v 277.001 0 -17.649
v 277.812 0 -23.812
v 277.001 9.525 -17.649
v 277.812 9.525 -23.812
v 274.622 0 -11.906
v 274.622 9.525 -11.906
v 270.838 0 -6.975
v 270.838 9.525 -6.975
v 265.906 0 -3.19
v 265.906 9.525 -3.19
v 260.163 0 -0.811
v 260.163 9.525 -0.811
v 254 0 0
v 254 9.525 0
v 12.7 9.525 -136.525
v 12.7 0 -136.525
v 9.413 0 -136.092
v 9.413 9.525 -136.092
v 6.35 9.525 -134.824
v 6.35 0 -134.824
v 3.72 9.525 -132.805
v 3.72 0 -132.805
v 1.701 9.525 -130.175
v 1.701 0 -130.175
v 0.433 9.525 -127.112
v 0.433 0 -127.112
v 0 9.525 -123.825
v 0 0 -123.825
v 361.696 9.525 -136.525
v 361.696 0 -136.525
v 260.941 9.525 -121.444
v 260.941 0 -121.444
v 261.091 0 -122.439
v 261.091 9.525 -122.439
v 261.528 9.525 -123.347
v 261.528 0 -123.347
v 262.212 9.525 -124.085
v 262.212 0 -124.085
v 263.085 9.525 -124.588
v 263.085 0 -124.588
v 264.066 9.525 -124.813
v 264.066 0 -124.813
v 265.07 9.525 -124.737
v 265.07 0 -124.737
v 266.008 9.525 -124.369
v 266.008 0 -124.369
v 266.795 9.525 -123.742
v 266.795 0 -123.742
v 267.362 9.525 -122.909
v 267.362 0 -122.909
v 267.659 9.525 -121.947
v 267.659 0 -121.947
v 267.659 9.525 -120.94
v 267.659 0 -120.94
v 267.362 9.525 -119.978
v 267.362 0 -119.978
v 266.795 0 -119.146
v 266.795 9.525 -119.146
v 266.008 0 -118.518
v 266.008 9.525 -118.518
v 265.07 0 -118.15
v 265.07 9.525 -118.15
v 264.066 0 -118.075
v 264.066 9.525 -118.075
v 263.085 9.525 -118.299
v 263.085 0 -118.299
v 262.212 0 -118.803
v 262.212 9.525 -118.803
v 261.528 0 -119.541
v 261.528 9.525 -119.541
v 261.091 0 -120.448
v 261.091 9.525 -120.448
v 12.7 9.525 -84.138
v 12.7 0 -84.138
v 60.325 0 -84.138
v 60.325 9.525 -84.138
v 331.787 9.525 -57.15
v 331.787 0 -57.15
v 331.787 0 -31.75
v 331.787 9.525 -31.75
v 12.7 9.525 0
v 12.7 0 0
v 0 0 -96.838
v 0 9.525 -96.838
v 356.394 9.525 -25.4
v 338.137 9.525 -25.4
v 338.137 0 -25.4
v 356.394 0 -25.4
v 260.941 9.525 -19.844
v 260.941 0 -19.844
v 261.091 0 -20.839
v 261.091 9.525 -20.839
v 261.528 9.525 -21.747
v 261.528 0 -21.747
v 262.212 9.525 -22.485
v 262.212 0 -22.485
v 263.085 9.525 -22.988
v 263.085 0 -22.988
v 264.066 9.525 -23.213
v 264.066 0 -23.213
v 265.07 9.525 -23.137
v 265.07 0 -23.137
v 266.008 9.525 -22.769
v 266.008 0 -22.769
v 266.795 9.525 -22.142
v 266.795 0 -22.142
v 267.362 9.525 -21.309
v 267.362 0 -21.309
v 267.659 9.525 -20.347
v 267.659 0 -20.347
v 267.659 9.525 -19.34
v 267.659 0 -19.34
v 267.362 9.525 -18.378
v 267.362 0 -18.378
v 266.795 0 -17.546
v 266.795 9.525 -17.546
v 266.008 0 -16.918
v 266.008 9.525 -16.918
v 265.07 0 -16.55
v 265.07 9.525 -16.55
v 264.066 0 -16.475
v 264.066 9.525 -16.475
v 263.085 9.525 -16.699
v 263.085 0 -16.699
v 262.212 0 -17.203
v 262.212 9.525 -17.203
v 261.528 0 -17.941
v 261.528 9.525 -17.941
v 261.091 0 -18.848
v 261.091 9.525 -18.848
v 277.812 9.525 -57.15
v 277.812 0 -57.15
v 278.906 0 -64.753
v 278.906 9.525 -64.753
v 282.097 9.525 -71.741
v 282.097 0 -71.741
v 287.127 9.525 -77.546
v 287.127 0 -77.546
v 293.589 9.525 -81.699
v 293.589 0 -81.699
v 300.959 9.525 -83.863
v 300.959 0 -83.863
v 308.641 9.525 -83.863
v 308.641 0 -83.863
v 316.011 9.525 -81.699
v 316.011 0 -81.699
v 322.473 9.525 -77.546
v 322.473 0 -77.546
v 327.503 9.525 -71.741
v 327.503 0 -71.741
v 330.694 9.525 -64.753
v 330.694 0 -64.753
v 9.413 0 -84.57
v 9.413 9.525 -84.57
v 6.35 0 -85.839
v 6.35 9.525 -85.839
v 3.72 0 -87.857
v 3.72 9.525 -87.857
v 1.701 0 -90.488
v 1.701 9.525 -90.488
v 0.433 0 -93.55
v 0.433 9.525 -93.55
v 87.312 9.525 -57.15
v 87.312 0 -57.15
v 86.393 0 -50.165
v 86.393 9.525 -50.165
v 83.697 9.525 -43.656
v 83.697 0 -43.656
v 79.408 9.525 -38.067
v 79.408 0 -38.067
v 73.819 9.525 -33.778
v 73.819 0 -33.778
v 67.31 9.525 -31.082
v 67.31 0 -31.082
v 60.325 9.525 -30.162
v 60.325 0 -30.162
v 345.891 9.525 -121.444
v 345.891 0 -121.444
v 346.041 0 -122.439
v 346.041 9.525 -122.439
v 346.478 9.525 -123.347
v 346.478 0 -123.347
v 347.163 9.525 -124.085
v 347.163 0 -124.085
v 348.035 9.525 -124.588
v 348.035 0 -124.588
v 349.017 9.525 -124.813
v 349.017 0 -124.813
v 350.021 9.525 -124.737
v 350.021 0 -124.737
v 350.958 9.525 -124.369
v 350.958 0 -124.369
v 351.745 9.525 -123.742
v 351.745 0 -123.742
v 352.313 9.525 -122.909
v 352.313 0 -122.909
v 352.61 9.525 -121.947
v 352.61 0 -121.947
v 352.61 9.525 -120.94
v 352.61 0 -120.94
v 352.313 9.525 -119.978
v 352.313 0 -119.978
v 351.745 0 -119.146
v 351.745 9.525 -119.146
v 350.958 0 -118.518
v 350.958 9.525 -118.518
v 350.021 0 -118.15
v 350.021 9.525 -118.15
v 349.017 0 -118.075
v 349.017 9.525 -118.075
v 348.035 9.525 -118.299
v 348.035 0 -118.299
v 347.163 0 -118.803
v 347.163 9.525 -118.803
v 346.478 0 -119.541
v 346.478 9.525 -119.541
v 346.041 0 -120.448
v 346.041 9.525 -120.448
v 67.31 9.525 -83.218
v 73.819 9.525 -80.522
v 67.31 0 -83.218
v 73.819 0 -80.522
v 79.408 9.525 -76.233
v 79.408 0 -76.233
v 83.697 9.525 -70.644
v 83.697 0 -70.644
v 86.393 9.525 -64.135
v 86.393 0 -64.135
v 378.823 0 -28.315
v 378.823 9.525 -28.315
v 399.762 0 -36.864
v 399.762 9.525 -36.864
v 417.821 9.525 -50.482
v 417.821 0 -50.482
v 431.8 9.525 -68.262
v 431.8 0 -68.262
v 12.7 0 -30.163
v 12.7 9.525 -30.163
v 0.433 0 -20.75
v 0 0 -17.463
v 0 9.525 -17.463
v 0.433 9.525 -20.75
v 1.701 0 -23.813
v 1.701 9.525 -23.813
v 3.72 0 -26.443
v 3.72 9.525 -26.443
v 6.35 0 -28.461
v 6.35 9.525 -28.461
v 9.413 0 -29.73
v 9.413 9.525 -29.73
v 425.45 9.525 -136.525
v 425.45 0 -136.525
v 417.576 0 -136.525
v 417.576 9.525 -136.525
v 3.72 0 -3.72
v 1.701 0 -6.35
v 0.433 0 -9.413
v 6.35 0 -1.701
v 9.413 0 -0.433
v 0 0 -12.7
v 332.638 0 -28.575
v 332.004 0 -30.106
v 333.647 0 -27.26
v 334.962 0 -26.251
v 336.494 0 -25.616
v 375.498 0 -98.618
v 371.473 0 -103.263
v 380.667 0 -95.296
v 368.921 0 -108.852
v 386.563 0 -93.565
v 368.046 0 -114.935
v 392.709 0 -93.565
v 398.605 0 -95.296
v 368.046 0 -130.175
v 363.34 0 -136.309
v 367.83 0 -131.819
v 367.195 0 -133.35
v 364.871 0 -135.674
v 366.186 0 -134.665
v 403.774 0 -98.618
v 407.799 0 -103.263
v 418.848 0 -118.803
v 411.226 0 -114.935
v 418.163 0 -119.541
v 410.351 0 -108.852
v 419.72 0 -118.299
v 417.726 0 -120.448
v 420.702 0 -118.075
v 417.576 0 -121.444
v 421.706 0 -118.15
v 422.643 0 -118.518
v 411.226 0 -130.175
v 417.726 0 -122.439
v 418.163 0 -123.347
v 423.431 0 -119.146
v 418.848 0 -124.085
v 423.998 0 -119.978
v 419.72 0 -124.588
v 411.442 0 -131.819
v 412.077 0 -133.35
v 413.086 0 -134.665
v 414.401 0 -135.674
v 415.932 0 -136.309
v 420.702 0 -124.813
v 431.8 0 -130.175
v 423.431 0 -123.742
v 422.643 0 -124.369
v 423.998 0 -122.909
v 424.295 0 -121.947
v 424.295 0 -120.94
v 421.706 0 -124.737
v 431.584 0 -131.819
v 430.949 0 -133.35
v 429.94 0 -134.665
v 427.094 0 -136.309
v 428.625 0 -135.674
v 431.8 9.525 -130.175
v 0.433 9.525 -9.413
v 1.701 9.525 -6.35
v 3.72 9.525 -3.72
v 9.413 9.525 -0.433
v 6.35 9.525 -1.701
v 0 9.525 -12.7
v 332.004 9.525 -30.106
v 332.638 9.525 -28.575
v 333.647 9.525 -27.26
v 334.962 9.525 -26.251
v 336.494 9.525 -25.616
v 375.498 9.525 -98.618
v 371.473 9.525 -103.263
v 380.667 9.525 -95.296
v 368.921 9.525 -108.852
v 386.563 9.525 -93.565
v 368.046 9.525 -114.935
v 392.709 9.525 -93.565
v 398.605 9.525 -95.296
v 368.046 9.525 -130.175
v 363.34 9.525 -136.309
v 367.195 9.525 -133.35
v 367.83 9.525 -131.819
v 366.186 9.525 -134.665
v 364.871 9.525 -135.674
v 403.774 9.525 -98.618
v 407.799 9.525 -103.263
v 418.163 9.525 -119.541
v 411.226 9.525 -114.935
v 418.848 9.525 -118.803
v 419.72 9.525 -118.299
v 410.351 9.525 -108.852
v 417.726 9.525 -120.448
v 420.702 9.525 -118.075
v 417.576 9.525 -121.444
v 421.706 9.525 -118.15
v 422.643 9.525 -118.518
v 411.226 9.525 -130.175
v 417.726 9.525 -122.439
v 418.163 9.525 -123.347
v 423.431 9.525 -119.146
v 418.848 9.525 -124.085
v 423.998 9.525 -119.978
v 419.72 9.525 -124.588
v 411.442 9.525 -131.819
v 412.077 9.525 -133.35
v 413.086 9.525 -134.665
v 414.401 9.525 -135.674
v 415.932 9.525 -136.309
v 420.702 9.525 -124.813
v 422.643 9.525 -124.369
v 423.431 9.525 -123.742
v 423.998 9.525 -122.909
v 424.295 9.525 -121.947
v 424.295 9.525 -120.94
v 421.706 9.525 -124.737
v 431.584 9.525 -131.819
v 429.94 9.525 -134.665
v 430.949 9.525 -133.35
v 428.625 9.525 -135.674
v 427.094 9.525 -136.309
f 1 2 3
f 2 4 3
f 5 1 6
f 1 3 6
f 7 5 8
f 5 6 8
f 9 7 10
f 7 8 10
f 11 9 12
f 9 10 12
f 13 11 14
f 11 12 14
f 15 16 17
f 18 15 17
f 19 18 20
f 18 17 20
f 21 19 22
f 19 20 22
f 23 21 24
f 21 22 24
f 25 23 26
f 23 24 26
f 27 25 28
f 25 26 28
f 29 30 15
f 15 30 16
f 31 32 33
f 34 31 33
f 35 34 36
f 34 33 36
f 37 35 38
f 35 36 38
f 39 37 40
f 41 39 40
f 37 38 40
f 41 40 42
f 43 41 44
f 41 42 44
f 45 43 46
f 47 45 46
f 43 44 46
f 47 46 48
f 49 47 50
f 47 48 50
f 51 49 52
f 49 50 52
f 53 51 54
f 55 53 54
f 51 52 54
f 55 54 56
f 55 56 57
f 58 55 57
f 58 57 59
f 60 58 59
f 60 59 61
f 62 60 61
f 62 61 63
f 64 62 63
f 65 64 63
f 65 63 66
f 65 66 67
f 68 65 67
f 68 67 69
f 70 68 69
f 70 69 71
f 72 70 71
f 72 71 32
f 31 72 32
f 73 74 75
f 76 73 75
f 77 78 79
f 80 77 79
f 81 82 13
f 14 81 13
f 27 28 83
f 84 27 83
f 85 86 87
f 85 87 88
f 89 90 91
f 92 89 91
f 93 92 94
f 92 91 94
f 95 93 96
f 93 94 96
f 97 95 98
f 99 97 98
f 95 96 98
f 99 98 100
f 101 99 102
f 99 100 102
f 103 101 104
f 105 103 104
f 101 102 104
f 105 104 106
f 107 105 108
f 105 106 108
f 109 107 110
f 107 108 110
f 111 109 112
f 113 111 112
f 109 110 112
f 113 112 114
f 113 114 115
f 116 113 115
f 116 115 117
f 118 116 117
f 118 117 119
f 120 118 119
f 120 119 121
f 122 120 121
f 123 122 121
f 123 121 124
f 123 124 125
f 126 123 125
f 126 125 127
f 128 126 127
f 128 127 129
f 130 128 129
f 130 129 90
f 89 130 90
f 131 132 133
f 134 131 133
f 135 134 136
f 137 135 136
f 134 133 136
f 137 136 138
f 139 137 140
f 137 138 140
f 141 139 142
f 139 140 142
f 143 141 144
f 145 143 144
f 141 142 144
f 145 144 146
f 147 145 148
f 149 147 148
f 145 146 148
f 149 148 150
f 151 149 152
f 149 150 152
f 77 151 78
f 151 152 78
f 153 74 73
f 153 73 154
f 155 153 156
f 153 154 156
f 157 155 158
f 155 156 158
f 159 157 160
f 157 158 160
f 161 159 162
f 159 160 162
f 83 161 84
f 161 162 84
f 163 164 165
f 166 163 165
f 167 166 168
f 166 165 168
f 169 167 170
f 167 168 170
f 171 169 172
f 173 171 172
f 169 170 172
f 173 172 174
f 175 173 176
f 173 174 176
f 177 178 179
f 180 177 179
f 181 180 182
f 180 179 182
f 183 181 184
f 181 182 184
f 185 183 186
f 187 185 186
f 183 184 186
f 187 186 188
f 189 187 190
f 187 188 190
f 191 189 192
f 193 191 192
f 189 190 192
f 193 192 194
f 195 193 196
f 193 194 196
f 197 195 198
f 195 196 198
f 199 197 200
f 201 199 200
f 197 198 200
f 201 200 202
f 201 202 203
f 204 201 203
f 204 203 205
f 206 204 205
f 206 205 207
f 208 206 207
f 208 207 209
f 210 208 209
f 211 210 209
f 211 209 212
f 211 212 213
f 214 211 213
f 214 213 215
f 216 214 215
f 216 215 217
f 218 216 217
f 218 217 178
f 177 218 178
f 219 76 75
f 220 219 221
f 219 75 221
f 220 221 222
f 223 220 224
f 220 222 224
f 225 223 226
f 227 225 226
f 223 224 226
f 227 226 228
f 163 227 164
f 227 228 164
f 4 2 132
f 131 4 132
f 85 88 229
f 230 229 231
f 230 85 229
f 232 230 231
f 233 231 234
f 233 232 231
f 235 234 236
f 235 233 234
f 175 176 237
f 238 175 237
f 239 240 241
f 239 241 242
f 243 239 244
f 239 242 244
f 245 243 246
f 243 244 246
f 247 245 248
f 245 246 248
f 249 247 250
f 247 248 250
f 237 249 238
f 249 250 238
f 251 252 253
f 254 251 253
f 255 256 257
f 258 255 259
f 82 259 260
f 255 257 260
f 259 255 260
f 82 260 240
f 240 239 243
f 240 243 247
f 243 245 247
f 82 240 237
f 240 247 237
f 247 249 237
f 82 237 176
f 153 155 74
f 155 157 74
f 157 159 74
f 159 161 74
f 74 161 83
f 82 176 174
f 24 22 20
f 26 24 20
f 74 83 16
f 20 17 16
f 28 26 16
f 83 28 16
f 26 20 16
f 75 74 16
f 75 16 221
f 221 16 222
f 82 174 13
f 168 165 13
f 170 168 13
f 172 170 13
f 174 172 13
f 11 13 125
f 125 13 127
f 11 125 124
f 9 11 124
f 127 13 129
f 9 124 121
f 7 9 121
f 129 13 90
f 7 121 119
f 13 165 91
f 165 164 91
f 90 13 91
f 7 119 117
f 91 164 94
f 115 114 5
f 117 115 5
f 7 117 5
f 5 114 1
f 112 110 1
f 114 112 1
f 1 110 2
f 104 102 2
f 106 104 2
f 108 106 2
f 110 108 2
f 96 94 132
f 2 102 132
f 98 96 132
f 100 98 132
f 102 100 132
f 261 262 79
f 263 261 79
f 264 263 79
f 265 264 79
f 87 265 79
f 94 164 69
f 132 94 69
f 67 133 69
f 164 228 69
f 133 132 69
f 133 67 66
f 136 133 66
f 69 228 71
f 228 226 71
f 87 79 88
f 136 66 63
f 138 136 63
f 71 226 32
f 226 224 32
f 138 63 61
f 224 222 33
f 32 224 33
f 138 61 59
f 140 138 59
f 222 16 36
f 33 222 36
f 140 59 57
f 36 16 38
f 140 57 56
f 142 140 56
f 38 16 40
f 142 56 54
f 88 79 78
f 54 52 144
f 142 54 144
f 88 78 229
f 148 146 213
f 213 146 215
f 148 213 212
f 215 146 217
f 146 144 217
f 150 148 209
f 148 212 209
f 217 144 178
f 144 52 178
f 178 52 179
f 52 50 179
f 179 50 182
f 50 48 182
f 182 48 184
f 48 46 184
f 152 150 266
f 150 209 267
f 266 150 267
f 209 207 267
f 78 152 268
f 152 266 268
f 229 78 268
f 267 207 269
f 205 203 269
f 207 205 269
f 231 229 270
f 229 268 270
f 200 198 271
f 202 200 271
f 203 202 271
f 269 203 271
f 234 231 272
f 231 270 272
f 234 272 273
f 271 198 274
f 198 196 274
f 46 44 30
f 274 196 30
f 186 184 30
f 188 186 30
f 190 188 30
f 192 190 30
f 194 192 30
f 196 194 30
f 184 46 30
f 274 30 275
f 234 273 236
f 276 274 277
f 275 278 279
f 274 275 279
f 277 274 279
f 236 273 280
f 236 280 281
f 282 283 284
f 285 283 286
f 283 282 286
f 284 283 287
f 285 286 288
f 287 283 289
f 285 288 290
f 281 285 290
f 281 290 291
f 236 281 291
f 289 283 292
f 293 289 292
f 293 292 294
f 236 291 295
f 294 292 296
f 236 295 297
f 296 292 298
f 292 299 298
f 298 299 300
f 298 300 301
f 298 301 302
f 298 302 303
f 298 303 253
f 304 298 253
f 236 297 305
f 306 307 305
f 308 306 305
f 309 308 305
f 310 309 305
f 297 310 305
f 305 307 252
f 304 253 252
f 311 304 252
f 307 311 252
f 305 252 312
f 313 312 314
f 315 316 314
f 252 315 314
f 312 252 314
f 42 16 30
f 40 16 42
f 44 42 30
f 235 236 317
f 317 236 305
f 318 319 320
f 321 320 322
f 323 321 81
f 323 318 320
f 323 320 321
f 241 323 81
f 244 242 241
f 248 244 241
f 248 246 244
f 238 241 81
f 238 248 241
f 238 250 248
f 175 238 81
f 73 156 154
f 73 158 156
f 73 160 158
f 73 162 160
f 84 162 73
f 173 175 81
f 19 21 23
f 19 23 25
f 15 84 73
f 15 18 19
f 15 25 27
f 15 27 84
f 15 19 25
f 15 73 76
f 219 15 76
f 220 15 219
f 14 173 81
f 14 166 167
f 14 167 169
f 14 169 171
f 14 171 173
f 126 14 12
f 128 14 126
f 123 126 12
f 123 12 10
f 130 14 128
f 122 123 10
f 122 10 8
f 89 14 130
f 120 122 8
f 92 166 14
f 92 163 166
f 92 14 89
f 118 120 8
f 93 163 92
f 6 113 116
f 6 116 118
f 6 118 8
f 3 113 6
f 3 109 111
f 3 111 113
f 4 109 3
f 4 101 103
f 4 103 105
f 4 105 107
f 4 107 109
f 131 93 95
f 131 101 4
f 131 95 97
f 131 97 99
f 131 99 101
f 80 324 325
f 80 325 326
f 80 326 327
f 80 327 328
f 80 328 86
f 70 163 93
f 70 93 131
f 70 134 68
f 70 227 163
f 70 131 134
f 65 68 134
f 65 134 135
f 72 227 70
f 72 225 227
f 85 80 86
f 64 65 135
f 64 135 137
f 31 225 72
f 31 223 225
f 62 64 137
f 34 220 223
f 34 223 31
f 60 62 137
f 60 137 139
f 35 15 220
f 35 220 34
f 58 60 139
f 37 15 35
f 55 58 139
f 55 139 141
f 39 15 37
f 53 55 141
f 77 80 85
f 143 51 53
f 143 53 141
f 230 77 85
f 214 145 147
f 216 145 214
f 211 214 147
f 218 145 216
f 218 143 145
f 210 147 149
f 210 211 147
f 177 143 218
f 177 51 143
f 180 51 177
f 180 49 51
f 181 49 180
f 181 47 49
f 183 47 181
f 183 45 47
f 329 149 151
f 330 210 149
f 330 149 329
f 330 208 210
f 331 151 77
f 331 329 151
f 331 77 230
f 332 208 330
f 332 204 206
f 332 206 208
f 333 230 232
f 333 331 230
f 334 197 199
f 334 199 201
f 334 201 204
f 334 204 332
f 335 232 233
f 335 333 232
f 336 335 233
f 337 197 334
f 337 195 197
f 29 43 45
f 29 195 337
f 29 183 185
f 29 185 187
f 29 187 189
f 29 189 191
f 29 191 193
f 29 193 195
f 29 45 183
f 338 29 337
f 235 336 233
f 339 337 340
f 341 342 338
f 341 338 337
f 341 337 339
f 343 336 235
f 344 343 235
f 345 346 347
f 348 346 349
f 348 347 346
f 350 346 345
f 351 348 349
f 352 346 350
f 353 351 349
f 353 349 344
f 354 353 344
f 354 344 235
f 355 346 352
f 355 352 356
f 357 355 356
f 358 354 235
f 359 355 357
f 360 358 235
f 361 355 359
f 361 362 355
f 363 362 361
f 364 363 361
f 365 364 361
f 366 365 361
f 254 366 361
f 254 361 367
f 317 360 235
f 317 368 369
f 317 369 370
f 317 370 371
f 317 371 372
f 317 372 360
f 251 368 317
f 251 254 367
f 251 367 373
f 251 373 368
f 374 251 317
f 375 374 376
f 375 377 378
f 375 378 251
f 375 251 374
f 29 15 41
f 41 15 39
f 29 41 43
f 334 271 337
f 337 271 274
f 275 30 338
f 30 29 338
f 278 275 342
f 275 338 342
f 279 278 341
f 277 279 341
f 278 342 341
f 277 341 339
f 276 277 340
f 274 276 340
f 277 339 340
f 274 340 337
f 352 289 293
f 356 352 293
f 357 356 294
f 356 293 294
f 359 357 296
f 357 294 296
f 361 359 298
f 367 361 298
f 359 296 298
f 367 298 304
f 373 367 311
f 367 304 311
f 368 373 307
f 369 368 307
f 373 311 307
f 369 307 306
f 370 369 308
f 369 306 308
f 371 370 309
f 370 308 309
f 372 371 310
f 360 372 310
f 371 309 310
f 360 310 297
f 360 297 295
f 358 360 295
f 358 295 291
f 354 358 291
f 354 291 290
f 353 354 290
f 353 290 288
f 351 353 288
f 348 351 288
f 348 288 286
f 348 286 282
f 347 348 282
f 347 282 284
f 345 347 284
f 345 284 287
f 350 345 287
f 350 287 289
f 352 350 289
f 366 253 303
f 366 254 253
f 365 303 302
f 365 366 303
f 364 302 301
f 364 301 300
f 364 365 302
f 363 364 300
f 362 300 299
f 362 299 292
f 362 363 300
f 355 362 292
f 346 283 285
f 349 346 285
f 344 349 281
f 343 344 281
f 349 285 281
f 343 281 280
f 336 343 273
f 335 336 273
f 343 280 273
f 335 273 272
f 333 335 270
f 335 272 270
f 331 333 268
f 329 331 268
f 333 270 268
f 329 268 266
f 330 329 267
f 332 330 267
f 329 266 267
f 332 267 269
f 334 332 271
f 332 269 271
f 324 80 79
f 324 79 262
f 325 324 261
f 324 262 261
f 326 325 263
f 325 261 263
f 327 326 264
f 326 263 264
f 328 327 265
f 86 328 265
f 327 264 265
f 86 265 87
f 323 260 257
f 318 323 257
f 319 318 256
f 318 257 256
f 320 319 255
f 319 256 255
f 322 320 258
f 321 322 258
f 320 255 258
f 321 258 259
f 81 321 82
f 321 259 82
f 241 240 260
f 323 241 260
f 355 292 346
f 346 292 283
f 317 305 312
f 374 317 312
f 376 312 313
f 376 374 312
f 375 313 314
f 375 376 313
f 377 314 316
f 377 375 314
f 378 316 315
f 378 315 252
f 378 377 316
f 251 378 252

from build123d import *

# Parameters (mm, degrees)
BOSS_EXTRUDE2_DEPTH     = 9.525
CUT_EXTRUDE2_DEPTH      = 10.525
F_1_4_CLEARANCE_HOLE1_D = 6.7564
FILLET5_R               = 23.8125
FILLET6_R               = 12.7
FILLET7_R               = 6.35


with BuildPart() as part:
    # Sketch1 → Boss-Extrude2 (new body)
    with BuildSketch(Plane(origin=(0, 0, 0), x_dir=(1, 0, 0), z_dir=(0, 1, 0))):
        with BuildLine():
            Line((25.4, 0), (277.8125, 0))
            Line((277.8125, 0), (277.8125, 57.15))
            ThreePointArc((277.8125, 57.15), (304.8, 84.1375), (331.78749993, 57.15))
            Line((331.78749993, 57.15), (331.78749993, 0))
            Line((331.78749993, 0), (357.18749993, 0))
            ThreePointArc((357.18749993, 0), (407.751306336, 19.640432558), (431.8, 68.2625))
            Line((431.8, 68.2625), (431.8, 136.525))
            Line((431.8, 136.525), (411.226, 136.525))
            Line((411.226, 136.525), (411.226, 114.935))
            ThreePointArc((411.226, 114.935), (389.636, 93.345), (368.046, 114.935))
            Line((368.046, 114.935), (368.046, 136.525))
            Line((368.046, 136.525), (23.8125, 136.525))
            Line((23.8125, 136.525), (12.7, 136.525))
            ThreePointArc((12.7, 136.525), (3.719743879, 132.805256121), (0, 123.825))
            Line((0, 123.825), (0, 96.8375))
            Line((0, 96.8375), (0, 84.1375))
            Line((0, 84.1375), (22.225, 84.1375))
            Line((22.225, 84.1375), (60.325, 84.1375))
            ThreePointArc((60.325, 84.1375), (79.408044257, 76.233044257), (87.3125, 57.15))
            ThreePointArc((87.3125, 57.15), (79.408044257, 38.066955743), (60.325, 30.1625))
            Line((60.325, 30.1625), (22.225, 30.1625))
            Line((22.225, 30.1625), (0, 30.1625))
            Line((0, 30.1625), (0, 17.4625))
            Line((0, 17.4625), (0, 12.7))
            ThreePointArc((0, 12.7), (3.719743879, 3.719743879), (12.7, 0))
            Line((12.7, 0), (25.4, 0))
        make_face()
    extrude(amount=BOSS_EXTRUDE2_DEPTH)

    # Sketch2 → Cut-Extrude2 (cut, through all)
    with BuildSketch(Plane(origin=(0, 9.525, 0), x_dir=(1, 0, 0), z_dir=(0, 1, 0))):
        with BuildLine():
            Line((331.78749993, 0), (331.78749993, 25.4))
            Line((331.78749993, 25.4), (356.39375, 25.4))
            ThreePointArc((356.39375, 25.4), (399.762219091, 36.86444095), (431.8, 68.2625))
            ThreePointArc((431.8, 68.2625), (407.751306336, 19.640432558), (357.18749993, 0))
            Line((357.18749993, 0), (331.78749993, 0))
        make_face()
    extrude(amount=-CUT_EXTRUDE2_DEPTH, mode=Mode.SUBTRACT)

    # 1/4 Clearance Hole1 (through all)
    with Locations(Plane(origin=(0, 9.525, 0), x_dir=(1, 0, 0), z_dir=(0, 1, 0))):
        with Locations((420.9542, 121.44375), (349.26905, 121.44375), (264.318750035, 121.44375), (264.318750035, 19.84375)):
            Hole(F_1_4_CLEARANCE_HOLE1_D / 2)

    # Fillet5
    fillet5_edges = [part.edges().sort_by_distance(p)[0] for p in [
        (277.8125, 4.7625, 0),
    ]]
    fillet(fillet5_edges, radius=FILLET5_R)

    # Fillet6
    fillet6_edges = [part.edges().sort_by_distance(p)[0] for p in [
        (0, 4.7625, -84.1375),
        (0, 4.7625, -30.1625),
    ]]
    fillet(fillet6_edges, radius=FILLET6_R)

    # Fillet7
    fillet7_edges = [part.edges().sort_by_distance(p)[0] for p in [
        (431.8, 4.7625, -136.525),
        (411.226, 4.7625, -136.525),
        (368.046, 4.7625, -136.525),
        (331.78749993, 4.7625, -25.4),
    ]]
    fillet(fillet7_edges, radius=FILLET7_R)


solid = part.part
